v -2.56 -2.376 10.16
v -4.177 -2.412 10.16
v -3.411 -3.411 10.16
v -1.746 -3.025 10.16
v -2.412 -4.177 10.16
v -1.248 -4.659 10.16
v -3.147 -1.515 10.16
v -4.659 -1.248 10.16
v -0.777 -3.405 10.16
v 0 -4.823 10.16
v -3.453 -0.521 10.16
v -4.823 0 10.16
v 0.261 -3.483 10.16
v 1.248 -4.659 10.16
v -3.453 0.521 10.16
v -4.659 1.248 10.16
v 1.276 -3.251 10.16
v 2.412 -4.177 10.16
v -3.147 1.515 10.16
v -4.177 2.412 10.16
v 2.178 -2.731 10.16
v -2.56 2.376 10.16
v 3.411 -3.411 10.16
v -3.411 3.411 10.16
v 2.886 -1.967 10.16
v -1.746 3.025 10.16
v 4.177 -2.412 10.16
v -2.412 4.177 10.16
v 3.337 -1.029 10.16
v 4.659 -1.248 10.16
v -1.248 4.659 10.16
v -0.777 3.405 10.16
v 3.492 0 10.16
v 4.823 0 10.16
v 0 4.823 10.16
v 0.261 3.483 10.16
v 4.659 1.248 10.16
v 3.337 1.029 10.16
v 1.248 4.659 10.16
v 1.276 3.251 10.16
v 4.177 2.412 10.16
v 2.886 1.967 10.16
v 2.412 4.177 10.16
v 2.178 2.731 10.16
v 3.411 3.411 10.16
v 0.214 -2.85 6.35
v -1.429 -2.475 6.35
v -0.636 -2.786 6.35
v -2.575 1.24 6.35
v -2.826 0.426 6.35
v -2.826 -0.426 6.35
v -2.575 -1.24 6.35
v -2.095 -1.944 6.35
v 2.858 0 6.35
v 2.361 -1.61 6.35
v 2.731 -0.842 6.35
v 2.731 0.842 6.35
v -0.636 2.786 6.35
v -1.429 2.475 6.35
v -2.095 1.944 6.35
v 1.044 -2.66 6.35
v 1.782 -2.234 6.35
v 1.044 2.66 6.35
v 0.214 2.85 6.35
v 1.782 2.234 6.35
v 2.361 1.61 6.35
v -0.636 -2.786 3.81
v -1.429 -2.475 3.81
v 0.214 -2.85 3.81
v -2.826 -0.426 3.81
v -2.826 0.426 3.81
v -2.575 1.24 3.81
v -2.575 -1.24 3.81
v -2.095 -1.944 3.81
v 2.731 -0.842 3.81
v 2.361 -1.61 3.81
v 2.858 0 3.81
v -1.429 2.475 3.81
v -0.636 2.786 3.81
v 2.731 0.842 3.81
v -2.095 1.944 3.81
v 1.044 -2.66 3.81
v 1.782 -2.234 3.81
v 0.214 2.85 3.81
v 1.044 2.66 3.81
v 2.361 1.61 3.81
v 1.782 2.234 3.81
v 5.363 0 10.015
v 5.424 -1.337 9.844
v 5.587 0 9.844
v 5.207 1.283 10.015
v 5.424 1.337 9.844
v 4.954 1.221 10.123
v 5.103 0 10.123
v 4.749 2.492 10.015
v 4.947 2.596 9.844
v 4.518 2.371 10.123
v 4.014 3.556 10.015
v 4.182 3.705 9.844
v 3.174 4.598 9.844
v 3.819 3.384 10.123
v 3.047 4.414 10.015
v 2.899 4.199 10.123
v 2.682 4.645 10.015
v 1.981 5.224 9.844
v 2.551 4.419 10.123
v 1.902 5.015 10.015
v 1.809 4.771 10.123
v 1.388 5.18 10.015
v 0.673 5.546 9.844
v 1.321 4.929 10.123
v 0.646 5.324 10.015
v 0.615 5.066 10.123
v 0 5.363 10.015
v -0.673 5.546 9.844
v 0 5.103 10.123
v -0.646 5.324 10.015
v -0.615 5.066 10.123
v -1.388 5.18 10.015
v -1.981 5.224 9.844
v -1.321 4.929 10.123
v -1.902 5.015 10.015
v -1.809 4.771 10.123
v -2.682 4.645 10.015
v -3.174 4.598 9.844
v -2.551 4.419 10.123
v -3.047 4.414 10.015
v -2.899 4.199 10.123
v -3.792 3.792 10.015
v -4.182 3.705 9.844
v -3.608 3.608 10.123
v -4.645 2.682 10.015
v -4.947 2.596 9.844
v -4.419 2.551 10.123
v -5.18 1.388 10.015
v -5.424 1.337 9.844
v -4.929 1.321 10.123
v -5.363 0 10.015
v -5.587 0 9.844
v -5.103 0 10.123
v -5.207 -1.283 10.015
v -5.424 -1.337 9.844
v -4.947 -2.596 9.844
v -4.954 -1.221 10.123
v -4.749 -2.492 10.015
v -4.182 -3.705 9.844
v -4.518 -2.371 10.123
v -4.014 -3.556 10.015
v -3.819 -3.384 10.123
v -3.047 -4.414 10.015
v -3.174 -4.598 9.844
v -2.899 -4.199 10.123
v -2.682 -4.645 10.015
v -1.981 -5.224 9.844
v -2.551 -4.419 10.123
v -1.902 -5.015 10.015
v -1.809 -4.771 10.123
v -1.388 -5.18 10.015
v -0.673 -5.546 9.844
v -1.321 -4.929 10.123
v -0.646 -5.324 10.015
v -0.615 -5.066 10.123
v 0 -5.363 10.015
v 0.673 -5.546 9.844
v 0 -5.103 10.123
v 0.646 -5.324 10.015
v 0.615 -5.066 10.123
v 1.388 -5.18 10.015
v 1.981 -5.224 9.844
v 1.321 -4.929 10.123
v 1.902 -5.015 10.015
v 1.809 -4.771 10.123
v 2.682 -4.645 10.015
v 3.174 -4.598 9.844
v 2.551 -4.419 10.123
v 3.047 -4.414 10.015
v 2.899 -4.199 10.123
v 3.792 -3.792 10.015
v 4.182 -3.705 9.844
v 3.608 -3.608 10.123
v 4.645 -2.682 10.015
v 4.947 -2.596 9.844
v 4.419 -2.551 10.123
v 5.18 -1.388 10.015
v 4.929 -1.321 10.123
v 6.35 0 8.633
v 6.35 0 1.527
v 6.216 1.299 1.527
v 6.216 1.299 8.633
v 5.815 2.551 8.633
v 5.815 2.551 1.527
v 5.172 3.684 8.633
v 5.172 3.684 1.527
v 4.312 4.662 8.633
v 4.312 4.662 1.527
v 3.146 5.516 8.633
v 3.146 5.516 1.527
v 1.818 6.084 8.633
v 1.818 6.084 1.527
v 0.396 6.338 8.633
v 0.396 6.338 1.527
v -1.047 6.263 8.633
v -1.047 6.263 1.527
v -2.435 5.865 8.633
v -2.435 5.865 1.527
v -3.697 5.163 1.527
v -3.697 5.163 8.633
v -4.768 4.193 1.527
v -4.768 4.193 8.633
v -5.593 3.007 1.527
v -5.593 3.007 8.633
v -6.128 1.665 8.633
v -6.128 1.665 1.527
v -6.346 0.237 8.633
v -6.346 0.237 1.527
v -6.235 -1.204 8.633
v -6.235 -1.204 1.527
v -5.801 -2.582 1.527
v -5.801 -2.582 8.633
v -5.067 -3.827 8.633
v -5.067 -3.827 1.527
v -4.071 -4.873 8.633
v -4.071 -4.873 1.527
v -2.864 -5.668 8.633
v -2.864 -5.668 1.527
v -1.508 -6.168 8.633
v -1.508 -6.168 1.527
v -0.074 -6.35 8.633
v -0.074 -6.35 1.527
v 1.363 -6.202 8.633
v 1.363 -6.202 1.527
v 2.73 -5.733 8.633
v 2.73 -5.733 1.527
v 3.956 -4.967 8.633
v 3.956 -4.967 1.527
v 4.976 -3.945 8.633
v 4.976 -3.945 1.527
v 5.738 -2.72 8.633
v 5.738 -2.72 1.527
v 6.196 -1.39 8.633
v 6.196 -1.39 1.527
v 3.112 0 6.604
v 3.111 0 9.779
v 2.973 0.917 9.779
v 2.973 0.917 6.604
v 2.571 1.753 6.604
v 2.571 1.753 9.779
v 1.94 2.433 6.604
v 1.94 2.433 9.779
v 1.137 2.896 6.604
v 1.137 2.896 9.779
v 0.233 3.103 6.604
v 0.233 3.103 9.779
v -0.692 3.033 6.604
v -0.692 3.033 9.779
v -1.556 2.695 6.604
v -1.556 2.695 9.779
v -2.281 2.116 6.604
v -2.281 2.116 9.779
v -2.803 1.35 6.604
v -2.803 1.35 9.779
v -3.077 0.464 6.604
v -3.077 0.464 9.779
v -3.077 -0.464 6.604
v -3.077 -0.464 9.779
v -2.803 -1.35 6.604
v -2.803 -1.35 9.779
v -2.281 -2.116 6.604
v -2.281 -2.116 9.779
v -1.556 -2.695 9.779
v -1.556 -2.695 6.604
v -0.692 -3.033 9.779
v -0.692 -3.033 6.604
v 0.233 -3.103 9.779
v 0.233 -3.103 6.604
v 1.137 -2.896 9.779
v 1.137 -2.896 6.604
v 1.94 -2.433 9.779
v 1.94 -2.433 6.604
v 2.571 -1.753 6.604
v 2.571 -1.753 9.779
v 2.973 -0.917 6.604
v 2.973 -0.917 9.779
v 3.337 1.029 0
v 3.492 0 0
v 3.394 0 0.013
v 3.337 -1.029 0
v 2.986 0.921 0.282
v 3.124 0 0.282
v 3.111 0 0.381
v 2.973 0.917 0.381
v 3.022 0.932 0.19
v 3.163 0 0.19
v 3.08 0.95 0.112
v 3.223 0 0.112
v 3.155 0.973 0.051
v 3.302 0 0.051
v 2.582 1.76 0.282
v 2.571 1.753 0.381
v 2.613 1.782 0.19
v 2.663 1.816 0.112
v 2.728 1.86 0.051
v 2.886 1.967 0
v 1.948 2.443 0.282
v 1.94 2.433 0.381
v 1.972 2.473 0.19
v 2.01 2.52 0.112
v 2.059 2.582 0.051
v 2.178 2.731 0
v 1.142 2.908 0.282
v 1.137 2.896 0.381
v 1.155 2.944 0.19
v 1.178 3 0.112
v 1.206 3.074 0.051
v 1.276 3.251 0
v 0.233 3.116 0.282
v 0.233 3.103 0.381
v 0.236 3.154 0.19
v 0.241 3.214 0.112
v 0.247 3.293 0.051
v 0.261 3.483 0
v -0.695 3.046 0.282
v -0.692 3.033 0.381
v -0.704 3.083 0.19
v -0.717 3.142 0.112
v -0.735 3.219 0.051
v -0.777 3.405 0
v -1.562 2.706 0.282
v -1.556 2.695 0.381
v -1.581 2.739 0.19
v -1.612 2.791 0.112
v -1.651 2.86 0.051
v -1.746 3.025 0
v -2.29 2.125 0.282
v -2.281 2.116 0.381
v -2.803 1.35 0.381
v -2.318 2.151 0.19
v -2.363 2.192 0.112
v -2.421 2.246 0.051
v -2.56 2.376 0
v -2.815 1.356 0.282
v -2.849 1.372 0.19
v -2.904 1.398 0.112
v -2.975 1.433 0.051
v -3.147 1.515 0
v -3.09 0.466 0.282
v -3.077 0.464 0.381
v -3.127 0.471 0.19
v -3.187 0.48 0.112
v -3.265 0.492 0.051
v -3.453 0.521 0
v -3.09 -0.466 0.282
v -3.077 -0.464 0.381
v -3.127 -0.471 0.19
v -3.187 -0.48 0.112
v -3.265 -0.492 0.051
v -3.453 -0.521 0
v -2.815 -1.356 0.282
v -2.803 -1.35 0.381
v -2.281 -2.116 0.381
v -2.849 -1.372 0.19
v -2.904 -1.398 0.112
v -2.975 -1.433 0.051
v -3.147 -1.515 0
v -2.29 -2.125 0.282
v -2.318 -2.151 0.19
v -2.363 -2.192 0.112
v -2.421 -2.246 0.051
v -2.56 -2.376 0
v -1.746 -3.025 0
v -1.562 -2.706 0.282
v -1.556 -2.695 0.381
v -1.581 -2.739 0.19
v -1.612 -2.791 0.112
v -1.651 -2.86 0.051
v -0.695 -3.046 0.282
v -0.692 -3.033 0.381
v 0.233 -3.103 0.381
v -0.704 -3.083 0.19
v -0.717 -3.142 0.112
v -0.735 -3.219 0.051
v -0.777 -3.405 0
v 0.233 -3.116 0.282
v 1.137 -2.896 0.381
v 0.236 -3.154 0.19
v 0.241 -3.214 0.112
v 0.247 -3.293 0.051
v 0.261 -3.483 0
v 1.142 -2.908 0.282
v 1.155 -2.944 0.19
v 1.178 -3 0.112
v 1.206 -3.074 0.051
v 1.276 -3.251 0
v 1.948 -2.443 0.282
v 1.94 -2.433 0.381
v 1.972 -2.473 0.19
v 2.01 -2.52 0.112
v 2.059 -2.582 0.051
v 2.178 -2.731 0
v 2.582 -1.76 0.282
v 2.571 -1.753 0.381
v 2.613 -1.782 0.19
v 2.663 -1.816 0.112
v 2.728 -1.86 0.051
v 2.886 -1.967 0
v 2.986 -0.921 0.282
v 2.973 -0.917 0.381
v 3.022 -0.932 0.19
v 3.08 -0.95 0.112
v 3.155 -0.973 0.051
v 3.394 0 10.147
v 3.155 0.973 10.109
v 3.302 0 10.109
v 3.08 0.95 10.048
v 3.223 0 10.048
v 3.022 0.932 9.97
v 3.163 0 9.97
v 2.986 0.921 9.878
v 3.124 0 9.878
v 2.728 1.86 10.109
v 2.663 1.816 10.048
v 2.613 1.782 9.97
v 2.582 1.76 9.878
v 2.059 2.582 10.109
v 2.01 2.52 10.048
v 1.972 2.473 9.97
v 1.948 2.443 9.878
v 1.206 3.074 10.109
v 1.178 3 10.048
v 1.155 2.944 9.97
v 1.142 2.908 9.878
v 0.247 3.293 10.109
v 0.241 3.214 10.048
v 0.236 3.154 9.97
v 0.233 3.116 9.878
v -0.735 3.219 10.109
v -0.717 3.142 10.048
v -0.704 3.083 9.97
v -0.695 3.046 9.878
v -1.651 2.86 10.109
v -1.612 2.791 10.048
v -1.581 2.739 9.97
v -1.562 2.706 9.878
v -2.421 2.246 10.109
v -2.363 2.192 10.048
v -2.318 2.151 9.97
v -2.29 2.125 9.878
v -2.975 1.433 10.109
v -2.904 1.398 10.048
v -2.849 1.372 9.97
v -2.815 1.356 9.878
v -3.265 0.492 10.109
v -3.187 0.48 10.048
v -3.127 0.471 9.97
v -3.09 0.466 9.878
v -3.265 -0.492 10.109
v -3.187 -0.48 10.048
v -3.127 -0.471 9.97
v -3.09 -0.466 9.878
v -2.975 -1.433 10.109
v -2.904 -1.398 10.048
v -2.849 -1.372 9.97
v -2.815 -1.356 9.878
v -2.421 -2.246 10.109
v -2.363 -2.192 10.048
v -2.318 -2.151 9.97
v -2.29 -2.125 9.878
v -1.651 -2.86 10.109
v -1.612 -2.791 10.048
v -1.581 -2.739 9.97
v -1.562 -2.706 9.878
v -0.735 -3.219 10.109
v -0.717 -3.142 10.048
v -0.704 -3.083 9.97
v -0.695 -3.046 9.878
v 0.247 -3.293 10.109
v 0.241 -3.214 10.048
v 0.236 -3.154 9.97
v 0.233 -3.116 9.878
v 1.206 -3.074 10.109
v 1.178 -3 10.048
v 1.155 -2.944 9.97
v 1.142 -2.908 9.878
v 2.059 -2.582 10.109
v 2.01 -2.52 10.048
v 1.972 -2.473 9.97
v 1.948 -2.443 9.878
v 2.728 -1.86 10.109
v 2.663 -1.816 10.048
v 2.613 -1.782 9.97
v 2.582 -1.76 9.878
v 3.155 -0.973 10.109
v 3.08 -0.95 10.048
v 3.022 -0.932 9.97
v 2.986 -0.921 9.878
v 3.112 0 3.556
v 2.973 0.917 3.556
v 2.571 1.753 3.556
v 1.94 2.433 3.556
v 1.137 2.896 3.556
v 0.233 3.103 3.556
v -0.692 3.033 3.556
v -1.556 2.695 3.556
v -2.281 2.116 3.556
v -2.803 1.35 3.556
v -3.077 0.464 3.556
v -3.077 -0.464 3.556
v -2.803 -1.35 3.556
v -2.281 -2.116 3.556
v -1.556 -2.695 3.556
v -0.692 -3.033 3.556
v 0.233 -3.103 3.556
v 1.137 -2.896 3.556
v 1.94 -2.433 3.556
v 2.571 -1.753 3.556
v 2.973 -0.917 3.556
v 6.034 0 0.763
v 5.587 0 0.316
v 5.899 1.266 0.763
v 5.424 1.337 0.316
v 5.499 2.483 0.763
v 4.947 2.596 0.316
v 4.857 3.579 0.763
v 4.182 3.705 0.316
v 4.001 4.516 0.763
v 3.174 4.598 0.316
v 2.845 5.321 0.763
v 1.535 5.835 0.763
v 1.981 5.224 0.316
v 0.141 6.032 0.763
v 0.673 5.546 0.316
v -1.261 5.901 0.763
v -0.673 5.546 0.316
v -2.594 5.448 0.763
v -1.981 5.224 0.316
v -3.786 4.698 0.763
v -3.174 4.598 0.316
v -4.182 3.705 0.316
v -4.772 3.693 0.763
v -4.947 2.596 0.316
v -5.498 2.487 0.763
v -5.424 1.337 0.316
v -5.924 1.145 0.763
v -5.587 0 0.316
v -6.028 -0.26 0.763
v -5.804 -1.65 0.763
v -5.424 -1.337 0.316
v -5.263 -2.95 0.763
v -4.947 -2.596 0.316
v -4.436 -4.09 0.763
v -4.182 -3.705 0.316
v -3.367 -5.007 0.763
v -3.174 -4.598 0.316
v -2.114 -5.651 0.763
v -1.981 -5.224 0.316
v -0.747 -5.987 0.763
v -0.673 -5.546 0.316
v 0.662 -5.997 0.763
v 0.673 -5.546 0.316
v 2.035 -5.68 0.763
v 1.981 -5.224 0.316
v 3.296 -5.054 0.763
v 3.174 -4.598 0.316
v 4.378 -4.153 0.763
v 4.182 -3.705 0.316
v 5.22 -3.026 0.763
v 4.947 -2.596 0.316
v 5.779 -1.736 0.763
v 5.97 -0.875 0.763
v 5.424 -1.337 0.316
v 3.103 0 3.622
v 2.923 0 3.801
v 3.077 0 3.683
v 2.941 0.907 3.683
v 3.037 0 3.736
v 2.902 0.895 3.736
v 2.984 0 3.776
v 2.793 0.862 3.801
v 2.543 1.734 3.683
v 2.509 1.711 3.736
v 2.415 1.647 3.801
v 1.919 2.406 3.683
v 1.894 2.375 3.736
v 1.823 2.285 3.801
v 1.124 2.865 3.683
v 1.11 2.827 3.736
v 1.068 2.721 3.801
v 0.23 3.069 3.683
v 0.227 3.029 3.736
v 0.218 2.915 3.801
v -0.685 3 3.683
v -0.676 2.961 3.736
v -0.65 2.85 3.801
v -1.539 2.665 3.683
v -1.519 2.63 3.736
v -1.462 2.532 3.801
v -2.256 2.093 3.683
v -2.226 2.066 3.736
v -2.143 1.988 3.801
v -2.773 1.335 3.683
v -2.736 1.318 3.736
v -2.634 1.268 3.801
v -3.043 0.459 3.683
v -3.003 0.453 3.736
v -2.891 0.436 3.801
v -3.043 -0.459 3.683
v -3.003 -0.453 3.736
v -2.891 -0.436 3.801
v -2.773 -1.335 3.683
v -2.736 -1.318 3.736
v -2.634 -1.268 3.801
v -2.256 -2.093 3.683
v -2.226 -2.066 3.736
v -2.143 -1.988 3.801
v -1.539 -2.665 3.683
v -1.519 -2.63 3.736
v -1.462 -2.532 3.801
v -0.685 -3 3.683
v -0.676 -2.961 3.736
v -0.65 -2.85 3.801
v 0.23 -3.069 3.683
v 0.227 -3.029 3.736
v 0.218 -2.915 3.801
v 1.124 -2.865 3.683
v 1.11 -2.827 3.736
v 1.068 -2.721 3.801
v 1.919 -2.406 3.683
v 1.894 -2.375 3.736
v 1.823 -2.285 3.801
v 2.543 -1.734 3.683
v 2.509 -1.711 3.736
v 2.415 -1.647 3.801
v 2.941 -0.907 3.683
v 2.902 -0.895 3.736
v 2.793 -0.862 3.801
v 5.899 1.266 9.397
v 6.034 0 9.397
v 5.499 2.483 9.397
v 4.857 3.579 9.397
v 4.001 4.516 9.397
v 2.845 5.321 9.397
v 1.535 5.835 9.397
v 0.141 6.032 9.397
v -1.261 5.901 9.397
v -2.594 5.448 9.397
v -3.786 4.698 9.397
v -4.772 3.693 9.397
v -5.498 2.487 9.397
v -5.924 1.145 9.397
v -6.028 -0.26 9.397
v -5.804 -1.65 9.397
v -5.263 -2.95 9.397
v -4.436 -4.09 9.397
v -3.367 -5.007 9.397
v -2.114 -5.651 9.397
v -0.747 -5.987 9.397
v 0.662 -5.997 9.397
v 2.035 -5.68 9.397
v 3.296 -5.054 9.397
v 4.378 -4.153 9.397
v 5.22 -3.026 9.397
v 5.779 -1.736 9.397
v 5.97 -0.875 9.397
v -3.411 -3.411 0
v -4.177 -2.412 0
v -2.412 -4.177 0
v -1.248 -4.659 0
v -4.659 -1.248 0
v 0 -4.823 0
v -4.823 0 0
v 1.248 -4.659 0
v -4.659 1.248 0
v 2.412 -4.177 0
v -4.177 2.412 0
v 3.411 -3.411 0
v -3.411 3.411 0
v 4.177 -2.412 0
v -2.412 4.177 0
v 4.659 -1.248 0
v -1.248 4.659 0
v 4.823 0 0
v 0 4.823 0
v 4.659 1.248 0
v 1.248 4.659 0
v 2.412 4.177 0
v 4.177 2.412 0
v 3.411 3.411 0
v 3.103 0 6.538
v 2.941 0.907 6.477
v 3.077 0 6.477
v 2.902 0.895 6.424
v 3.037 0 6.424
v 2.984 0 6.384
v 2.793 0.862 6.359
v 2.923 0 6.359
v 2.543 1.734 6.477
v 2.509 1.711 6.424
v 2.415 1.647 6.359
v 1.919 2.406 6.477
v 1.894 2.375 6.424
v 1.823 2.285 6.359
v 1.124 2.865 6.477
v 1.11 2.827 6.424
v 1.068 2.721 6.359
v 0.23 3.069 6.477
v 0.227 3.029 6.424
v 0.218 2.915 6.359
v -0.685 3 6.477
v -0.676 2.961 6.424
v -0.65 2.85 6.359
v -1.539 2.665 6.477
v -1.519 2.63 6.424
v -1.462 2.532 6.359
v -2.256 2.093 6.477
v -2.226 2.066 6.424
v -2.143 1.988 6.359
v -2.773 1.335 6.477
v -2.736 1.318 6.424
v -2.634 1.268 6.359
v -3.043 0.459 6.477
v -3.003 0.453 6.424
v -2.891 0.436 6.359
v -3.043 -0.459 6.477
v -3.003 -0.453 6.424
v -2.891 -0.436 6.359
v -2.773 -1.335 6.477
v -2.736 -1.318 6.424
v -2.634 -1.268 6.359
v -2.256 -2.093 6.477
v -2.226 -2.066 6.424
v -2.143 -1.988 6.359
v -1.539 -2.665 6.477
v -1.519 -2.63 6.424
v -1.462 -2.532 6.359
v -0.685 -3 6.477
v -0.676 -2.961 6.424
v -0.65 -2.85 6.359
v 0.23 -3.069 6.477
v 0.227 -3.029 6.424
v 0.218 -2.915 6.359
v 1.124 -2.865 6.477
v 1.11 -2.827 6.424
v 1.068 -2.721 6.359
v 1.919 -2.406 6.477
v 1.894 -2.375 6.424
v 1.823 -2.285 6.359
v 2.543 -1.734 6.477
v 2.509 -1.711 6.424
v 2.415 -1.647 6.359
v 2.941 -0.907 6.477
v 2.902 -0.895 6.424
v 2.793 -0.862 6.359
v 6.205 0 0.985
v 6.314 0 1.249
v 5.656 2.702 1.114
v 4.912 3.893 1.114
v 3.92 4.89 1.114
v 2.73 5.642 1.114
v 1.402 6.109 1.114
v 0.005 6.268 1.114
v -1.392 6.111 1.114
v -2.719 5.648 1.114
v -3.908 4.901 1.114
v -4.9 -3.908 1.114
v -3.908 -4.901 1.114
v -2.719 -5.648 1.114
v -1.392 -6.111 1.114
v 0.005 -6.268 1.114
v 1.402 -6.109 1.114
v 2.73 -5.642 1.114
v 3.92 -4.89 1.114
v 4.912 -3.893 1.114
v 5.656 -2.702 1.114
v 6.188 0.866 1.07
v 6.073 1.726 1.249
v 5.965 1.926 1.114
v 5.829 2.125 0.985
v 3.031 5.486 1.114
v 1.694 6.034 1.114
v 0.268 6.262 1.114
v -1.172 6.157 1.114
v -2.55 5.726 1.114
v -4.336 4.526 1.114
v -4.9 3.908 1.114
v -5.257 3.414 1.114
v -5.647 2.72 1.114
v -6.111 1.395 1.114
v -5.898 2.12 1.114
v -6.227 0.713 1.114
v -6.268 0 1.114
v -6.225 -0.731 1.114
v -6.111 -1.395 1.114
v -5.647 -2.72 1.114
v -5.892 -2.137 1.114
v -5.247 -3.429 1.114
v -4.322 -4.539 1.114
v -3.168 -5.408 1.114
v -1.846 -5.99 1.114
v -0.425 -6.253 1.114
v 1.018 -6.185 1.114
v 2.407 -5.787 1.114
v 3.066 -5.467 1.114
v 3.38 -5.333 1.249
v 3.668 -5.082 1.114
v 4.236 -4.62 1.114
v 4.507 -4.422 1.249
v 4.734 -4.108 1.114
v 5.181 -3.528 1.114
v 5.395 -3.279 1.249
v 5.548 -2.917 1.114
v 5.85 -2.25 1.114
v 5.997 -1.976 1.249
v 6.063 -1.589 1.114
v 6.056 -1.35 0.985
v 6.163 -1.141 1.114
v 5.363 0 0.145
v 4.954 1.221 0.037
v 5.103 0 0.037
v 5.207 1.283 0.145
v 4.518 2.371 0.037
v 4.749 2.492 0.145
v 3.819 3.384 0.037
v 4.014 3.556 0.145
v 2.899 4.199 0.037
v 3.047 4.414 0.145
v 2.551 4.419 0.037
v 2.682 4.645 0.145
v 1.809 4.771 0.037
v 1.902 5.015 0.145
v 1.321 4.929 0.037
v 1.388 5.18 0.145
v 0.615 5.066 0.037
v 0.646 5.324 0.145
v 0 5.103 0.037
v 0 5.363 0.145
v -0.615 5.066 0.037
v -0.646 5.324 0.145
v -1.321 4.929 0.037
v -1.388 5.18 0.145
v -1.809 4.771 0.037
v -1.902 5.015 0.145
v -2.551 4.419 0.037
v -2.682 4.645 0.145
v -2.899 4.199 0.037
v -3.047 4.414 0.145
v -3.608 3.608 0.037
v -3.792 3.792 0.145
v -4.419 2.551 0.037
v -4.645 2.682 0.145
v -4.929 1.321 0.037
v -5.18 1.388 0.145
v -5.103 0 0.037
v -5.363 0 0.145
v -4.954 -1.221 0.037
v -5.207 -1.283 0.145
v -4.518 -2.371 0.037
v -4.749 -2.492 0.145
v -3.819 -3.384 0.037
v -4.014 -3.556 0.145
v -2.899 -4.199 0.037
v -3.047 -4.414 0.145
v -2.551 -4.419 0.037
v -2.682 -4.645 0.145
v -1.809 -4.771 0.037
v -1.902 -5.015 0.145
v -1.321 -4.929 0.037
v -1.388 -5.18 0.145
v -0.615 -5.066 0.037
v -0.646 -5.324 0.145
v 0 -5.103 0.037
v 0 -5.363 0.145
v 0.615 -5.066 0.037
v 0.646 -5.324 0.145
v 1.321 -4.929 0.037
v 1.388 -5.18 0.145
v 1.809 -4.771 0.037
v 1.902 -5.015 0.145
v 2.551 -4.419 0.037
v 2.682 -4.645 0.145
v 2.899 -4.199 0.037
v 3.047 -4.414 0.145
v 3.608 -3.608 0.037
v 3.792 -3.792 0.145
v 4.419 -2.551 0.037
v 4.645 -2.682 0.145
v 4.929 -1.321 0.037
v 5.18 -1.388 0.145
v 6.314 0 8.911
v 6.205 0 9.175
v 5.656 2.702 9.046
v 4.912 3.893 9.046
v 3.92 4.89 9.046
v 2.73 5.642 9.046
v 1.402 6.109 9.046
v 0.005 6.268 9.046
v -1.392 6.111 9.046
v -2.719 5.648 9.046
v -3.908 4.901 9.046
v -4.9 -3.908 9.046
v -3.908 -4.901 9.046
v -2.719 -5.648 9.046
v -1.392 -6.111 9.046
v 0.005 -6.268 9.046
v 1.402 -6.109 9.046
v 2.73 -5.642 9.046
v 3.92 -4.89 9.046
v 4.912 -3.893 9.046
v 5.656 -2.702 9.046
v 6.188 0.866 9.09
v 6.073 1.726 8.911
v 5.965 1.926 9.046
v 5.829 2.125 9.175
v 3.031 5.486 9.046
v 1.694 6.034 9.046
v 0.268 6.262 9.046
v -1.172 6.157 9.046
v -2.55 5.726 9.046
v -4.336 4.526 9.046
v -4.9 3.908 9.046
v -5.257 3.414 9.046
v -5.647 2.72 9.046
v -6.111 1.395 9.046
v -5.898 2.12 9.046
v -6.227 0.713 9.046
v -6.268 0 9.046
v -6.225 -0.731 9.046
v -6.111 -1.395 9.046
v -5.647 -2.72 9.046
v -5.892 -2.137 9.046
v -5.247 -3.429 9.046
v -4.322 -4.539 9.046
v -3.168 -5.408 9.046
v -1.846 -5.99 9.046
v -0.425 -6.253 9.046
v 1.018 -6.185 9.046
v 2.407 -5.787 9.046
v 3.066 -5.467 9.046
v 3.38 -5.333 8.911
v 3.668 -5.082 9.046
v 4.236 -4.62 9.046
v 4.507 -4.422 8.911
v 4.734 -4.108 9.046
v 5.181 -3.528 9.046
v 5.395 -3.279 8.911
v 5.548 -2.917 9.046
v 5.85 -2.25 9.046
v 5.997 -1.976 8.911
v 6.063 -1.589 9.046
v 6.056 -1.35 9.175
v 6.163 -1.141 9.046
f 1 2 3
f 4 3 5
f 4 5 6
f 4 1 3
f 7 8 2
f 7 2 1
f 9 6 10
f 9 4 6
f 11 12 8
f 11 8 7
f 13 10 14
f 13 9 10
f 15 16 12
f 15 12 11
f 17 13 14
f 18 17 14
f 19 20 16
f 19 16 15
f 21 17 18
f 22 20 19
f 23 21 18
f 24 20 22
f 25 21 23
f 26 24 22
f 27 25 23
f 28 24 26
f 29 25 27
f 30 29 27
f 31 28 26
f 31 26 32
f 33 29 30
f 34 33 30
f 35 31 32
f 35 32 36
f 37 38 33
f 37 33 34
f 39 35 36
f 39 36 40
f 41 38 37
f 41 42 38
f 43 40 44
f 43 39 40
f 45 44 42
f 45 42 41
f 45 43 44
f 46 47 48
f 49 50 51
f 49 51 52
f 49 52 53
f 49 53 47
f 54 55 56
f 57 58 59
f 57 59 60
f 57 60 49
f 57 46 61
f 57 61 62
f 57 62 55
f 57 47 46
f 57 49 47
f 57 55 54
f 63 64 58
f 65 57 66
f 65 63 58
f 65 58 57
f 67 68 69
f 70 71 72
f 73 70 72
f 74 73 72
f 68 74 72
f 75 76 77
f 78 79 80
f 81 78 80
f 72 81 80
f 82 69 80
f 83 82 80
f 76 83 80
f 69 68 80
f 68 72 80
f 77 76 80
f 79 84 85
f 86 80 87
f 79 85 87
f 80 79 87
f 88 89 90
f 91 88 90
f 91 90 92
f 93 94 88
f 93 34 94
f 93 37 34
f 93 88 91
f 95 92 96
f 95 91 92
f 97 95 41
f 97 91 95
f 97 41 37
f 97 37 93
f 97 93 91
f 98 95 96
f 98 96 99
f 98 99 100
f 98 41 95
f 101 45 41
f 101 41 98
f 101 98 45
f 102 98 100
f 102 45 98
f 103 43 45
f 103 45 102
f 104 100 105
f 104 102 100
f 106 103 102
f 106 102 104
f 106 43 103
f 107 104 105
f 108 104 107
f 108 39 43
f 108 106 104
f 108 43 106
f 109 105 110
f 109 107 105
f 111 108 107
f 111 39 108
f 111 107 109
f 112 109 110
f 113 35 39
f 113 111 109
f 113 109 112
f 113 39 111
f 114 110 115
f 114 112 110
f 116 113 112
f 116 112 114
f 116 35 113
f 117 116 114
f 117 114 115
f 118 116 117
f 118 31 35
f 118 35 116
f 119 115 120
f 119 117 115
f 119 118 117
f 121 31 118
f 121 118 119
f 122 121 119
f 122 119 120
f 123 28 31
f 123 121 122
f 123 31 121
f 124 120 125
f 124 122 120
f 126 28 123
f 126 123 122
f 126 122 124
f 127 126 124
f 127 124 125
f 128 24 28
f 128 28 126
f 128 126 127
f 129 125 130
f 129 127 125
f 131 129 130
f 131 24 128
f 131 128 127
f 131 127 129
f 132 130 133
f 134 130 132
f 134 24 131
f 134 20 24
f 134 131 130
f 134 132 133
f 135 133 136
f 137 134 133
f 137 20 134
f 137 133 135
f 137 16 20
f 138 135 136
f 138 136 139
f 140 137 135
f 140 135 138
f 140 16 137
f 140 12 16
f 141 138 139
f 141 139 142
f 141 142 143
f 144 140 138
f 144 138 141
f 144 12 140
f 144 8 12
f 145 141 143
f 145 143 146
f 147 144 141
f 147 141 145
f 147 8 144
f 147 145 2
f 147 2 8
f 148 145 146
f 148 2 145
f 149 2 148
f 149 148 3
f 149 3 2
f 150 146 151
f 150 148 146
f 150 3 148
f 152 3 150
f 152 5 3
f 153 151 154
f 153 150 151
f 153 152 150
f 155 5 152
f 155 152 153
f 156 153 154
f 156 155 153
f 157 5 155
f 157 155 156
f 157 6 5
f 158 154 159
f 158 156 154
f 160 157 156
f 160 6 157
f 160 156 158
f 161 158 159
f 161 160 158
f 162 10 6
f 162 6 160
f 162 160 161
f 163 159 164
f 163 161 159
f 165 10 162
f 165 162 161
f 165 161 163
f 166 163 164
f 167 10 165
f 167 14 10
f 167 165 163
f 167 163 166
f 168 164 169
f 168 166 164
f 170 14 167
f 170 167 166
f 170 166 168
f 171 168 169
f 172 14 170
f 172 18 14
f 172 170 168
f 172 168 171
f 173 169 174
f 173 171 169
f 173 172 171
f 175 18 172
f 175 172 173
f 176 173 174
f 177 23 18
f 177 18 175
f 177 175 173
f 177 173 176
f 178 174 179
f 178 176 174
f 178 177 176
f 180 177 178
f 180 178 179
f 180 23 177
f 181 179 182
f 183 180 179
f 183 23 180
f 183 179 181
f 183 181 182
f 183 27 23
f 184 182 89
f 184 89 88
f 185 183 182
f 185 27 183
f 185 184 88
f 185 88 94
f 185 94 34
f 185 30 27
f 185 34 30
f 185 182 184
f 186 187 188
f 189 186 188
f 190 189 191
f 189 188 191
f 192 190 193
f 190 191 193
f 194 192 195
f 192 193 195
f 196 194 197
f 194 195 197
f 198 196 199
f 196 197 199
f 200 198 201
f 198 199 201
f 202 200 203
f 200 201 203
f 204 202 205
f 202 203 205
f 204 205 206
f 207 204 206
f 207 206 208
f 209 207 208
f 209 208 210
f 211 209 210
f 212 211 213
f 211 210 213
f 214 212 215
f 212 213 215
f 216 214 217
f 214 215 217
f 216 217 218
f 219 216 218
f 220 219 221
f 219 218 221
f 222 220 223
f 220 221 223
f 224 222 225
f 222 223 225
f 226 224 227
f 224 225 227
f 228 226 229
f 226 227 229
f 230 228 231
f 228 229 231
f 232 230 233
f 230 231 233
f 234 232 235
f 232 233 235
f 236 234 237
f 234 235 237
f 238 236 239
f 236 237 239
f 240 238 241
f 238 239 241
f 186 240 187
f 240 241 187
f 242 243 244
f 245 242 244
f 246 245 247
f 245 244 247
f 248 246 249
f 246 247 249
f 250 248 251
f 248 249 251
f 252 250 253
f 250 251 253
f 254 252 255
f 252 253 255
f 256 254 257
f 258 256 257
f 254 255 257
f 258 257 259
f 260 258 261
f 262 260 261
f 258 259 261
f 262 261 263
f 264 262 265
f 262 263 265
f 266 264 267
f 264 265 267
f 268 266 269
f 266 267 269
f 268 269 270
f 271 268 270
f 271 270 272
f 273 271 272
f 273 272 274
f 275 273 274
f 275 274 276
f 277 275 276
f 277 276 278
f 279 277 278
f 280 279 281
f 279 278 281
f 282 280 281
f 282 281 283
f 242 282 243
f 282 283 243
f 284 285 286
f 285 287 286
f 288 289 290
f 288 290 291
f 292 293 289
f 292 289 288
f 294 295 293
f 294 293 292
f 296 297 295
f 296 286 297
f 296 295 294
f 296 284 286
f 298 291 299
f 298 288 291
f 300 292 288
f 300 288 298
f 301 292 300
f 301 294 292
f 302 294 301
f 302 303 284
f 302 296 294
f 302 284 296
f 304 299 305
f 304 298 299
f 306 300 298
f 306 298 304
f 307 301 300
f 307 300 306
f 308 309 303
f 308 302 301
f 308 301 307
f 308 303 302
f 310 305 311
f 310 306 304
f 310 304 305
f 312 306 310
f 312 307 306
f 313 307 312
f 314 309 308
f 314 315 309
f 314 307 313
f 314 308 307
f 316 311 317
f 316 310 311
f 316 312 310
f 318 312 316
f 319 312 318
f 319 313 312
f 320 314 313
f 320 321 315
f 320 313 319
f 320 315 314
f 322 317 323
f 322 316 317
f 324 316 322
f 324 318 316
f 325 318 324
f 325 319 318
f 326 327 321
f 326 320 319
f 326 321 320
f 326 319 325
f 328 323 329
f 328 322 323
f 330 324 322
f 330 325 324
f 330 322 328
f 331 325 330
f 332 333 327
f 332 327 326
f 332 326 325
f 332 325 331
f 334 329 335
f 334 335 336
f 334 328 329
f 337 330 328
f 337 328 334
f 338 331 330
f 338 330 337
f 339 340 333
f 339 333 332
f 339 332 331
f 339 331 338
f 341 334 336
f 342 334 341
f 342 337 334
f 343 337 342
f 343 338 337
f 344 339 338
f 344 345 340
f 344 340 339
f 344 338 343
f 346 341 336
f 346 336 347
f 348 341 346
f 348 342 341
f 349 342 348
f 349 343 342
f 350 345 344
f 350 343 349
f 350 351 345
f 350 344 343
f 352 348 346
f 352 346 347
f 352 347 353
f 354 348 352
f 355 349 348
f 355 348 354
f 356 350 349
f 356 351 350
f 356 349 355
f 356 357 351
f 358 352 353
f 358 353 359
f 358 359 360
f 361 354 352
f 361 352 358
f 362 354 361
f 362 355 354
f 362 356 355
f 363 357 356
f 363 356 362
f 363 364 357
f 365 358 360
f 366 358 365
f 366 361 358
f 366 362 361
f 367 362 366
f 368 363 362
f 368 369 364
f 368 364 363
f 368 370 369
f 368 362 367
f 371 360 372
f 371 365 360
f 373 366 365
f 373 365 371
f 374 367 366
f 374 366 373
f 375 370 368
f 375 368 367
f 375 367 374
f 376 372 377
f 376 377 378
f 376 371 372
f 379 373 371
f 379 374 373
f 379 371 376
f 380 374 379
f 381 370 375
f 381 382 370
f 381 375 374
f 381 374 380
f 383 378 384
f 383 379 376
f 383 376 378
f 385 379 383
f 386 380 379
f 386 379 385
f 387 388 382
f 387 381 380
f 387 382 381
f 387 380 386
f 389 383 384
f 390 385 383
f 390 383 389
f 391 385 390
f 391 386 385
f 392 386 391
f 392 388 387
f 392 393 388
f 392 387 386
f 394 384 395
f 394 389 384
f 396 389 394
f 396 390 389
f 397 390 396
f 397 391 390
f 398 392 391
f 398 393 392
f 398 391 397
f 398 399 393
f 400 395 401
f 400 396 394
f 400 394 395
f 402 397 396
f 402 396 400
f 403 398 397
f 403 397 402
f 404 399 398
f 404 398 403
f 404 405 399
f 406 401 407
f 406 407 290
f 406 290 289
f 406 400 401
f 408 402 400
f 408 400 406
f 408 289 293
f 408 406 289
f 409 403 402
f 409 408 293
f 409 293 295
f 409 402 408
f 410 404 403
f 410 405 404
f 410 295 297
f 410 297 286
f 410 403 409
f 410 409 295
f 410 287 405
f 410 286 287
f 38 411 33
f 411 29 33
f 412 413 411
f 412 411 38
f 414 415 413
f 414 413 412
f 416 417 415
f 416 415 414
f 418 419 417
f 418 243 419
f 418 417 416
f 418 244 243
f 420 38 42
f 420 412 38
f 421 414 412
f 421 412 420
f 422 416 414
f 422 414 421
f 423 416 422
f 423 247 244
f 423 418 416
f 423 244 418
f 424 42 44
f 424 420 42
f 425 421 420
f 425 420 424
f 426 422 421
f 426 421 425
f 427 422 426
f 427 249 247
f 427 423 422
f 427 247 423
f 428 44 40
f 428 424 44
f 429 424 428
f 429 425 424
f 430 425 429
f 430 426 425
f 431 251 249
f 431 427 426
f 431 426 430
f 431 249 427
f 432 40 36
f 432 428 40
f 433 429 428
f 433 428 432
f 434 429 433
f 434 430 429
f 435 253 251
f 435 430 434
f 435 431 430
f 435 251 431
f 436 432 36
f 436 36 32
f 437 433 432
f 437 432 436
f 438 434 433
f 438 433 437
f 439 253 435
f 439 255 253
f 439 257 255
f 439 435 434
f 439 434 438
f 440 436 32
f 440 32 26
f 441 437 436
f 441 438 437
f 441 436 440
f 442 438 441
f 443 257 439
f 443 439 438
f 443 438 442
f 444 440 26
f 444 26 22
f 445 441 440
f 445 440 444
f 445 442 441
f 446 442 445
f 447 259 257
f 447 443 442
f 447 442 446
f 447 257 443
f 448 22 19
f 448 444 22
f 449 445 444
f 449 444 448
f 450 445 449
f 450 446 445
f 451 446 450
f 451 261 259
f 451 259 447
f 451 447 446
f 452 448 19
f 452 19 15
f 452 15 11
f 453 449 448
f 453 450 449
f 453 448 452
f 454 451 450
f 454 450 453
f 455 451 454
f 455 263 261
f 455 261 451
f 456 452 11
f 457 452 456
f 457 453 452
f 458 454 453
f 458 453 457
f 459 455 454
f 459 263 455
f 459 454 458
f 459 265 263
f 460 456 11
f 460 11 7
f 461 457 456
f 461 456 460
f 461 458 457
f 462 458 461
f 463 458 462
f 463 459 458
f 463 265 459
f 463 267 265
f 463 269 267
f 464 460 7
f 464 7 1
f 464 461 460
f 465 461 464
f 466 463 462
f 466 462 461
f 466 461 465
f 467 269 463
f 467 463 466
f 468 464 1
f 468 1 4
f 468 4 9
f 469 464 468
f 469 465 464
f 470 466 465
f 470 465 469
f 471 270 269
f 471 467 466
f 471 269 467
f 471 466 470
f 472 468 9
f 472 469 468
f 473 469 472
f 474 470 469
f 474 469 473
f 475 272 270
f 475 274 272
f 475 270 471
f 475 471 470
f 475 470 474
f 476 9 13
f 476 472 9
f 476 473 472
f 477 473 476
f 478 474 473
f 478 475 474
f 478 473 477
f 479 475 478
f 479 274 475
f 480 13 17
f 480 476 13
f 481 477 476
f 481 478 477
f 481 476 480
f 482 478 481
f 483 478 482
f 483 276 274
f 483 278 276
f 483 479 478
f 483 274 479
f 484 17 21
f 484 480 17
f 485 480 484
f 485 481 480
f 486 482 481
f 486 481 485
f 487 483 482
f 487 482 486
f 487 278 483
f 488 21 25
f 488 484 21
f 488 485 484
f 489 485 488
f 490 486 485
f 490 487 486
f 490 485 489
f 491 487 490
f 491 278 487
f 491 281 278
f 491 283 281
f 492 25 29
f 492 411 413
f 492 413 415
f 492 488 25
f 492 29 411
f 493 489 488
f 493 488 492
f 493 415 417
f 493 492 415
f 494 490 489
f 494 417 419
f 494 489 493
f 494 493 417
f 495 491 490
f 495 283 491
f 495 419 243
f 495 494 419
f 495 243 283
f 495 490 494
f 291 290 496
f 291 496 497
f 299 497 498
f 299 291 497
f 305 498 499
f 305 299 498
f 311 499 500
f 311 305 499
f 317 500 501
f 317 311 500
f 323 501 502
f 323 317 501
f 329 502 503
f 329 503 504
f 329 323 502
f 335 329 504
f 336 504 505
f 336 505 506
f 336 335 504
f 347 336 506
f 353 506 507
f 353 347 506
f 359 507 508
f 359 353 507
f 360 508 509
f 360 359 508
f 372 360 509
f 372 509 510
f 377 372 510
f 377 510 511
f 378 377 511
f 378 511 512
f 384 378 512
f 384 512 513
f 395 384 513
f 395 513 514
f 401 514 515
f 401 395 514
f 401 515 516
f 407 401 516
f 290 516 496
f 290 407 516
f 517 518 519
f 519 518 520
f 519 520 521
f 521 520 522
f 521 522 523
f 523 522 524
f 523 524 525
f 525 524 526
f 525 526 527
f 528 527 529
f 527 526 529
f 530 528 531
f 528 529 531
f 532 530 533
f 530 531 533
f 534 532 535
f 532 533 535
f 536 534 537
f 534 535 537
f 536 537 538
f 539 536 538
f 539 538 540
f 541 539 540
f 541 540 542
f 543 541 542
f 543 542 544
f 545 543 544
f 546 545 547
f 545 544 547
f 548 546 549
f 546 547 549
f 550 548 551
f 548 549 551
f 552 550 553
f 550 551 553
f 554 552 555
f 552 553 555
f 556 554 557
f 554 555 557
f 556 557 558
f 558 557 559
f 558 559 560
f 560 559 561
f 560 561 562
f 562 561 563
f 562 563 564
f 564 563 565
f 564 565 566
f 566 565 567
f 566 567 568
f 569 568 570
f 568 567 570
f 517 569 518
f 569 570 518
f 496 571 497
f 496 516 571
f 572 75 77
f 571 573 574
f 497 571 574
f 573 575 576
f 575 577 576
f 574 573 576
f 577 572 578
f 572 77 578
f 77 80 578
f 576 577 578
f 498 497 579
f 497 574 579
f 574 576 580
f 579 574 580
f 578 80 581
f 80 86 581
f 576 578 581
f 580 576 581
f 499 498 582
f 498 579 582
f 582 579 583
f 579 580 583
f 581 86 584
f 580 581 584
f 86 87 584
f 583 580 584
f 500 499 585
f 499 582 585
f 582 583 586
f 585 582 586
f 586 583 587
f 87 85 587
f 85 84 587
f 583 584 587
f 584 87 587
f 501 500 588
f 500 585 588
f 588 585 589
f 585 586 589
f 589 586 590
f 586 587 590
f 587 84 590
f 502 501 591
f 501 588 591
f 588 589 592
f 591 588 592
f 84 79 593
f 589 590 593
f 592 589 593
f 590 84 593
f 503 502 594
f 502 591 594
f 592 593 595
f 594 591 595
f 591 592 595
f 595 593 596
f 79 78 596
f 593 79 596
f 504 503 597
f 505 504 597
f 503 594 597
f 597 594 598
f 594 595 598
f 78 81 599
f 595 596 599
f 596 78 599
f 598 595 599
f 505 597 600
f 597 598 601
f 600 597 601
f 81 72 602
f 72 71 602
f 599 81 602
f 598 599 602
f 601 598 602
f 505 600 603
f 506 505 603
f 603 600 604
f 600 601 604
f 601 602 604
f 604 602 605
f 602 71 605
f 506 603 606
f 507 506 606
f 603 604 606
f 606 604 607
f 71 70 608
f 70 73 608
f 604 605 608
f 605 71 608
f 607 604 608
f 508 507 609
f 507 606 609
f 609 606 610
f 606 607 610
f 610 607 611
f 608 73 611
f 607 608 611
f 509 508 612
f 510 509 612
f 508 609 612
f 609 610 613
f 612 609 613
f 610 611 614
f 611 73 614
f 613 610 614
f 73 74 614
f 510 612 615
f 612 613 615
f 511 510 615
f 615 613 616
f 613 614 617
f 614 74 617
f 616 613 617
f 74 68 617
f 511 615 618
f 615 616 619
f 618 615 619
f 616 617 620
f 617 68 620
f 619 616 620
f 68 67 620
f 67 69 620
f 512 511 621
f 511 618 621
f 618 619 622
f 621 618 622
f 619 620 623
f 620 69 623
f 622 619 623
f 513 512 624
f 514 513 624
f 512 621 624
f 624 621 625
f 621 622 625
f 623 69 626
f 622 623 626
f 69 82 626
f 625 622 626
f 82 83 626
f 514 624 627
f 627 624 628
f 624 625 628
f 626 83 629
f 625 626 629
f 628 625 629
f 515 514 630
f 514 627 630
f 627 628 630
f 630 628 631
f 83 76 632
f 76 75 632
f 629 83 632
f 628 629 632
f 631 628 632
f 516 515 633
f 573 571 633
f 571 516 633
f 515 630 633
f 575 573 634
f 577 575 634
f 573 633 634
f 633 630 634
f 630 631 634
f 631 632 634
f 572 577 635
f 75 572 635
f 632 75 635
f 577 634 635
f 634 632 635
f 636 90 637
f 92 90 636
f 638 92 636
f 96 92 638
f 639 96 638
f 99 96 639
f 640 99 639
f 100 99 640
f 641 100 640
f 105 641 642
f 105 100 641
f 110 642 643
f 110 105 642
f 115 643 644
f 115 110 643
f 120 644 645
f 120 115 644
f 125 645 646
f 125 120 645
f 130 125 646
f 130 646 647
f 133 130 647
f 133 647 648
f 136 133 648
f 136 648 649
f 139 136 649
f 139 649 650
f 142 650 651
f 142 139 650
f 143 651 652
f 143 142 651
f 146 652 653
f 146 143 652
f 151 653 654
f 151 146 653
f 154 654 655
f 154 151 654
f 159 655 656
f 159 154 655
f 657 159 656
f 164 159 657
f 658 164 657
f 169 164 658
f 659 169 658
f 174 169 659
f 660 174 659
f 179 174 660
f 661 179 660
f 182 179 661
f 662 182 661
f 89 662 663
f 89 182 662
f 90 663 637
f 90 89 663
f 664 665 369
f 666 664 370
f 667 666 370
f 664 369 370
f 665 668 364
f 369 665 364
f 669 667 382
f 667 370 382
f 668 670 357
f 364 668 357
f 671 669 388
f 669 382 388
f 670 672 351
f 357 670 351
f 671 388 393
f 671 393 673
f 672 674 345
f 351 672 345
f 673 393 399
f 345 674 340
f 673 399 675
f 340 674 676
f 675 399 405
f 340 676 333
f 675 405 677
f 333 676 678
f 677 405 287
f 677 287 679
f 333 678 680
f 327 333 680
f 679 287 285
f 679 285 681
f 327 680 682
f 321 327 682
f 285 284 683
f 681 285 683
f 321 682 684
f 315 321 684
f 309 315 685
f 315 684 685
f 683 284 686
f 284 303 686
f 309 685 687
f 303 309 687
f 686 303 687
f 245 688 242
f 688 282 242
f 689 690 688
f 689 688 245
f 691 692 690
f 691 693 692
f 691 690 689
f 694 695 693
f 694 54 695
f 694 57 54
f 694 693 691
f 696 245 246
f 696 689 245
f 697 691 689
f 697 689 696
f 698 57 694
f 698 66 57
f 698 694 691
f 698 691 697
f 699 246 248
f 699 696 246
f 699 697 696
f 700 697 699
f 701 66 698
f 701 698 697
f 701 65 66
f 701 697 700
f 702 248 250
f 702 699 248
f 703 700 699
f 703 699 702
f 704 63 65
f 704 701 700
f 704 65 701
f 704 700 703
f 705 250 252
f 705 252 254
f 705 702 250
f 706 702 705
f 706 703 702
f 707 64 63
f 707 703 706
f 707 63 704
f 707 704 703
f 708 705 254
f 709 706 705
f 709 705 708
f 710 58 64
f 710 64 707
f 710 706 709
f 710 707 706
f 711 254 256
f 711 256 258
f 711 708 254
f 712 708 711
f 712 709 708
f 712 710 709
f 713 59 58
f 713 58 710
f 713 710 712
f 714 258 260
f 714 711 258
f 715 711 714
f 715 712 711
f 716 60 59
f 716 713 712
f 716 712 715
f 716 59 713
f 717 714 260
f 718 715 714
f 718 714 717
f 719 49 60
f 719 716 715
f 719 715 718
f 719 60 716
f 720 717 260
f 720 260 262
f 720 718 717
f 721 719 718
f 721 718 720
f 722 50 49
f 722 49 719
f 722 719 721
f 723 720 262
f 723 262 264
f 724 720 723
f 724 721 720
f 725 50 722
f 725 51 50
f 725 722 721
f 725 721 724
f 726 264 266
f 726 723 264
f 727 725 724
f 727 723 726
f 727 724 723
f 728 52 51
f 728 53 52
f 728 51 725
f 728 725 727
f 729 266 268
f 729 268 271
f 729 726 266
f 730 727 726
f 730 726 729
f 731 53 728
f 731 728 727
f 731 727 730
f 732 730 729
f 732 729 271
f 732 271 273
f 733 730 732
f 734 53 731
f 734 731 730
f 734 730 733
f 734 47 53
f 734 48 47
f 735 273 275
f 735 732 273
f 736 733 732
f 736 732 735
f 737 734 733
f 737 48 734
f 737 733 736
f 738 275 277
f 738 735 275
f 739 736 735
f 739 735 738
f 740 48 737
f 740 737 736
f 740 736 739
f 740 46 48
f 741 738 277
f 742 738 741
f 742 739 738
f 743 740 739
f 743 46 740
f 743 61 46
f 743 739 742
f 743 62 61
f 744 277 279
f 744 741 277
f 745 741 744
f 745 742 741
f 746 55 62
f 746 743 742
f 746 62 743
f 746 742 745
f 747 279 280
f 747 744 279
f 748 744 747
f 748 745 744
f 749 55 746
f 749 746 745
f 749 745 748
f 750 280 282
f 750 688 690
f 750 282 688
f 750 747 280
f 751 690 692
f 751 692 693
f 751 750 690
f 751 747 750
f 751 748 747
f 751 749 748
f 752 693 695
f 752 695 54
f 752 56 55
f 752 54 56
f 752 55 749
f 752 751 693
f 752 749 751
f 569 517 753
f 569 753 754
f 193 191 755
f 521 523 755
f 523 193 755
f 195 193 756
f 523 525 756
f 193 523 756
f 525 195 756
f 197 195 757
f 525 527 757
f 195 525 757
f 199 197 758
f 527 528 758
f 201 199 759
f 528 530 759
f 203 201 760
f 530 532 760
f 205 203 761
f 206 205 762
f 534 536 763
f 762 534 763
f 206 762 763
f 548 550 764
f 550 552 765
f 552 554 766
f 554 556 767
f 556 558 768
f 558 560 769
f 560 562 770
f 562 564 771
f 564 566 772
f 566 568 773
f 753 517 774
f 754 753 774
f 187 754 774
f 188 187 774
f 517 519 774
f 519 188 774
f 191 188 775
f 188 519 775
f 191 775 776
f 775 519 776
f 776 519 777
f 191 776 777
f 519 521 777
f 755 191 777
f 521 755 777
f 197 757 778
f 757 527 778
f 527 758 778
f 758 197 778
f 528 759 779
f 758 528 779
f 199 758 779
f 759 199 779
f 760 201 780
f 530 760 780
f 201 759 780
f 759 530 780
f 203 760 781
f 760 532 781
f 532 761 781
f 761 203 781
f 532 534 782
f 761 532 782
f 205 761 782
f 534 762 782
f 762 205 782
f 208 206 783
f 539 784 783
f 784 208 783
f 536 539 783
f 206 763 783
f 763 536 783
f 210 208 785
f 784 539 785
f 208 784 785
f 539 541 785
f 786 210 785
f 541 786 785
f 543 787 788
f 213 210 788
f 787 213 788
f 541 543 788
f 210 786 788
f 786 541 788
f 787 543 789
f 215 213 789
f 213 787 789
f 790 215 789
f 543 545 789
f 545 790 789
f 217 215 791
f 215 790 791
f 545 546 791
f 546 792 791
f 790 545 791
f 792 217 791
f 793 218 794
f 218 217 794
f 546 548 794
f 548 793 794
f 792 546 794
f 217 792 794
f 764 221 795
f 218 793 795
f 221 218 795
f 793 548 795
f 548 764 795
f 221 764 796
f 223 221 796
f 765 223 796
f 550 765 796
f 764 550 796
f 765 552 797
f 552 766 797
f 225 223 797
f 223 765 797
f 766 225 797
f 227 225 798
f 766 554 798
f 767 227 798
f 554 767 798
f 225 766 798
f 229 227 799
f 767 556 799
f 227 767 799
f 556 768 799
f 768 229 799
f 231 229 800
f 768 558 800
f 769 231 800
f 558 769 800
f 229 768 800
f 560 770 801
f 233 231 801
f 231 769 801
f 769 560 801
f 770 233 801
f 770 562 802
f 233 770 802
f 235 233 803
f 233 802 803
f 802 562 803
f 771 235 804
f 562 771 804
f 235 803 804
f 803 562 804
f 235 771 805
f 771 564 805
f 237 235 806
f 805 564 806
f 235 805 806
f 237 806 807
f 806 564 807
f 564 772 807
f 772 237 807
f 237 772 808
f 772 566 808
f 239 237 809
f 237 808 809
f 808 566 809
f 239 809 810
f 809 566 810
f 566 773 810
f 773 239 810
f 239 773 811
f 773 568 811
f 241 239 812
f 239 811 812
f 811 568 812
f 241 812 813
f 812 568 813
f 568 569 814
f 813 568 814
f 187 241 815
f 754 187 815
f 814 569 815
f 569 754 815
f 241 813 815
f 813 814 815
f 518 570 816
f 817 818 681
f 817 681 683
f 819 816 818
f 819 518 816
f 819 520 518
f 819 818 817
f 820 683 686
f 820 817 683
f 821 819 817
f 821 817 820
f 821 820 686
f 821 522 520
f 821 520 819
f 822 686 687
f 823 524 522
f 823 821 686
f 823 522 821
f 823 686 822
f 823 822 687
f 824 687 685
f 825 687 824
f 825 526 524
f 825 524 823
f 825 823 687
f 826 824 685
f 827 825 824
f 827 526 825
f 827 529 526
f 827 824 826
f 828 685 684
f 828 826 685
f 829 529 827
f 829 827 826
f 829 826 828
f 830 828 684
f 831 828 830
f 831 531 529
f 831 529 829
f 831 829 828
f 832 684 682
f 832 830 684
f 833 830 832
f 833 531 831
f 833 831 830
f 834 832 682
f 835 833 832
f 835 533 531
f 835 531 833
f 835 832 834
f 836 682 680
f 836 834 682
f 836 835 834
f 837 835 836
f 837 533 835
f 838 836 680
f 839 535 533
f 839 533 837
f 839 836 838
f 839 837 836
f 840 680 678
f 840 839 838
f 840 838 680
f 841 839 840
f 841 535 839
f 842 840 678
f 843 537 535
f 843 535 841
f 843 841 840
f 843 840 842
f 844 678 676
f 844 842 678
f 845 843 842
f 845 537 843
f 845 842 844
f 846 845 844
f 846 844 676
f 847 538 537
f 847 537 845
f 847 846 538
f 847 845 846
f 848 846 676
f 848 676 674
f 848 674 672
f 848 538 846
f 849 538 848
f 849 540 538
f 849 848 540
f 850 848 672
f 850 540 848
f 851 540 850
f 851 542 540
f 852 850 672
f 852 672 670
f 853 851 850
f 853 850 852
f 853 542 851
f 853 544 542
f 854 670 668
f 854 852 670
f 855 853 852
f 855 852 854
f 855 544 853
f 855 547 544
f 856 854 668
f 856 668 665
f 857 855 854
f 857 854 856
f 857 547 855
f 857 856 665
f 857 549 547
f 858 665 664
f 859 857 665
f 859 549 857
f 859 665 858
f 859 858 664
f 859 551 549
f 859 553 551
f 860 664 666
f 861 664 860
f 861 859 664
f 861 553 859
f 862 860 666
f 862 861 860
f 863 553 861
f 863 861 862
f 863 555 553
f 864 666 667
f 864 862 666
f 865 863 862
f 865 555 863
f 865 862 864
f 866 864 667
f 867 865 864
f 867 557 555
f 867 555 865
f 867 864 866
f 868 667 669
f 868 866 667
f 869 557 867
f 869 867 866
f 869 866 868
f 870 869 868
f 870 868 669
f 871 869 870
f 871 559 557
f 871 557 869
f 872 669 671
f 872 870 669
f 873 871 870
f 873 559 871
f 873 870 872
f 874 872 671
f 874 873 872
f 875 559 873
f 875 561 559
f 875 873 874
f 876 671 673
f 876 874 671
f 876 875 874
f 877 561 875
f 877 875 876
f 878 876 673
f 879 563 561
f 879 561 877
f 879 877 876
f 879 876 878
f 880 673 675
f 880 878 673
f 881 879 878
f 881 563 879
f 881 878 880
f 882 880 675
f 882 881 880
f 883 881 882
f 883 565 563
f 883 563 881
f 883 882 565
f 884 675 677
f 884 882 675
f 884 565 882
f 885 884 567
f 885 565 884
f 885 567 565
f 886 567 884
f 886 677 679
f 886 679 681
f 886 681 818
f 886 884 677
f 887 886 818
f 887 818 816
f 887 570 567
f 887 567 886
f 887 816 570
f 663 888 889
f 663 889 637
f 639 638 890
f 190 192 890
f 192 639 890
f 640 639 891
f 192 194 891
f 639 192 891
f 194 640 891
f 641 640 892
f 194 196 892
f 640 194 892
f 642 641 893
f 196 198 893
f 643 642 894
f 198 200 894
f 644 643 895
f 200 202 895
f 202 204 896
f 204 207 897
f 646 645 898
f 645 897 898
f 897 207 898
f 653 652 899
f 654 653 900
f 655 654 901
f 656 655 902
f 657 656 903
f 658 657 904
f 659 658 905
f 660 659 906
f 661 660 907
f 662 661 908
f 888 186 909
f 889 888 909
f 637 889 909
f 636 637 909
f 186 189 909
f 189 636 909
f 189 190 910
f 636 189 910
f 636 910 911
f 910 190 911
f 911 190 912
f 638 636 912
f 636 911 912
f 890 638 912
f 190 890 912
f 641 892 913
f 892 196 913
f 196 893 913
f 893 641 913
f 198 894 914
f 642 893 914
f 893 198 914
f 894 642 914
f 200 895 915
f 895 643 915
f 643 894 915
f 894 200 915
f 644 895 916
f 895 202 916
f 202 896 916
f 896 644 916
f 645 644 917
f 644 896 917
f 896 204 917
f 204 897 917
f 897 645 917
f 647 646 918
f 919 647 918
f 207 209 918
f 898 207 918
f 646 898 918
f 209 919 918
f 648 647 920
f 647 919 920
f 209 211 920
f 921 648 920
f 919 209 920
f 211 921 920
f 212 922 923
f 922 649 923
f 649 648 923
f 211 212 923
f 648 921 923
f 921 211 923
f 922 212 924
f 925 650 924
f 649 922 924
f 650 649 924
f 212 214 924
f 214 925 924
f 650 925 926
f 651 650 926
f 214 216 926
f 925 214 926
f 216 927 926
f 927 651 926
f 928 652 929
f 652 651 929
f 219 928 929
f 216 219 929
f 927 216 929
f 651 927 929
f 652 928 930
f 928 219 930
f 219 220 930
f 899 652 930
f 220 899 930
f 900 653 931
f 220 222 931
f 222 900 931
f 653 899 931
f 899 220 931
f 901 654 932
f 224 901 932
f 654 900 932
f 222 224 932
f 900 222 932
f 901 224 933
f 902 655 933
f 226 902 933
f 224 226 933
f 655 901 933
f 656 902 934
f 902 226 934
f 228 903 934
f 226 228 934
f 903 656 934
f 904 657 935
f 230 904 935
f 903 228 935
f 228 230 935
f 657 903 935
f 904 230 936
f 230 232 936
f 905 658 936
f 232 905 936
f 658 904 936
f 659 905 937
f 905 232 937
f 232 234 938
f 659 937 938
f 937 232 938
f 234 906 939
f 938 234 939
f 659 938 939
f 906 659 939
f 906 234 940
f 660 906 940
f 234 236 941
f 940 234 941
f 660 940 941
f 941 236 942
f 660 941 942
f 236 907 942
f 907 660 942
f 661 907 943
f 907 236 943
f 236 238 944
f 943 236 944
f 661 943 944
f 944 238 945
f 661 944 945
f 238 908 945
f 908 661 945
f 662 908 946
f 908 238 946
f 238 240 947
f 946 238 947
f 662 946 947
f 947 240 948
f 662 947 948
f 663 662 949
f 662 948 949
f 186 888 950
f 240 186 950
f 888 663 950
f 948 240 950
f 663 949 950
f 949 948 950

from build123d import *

# Parameters (mm, degrees)
SKETCH1_R           = 6.35
BOSS_EXTRUDE1_DEPTH = 10.16
SKETCH2_R           = 3.1115
CUT_EXTRUDE1_DEPTH  = 3.81
CHAMFER1_SIZE       = 1.0795
FILLET1_R           = 0.254
FILLET2_R           = 0.381
FILLET3_R           = 1.0795


with BuildPart() as part:
    # Sketch1 → Boss-Extrude1 (new body)
    with BuildSketch(Plane.XY):
        Circle(SKETCH1_R)
    extrude(amount=BOSS_EXTRUDE1_DEPTH)

    # Sketch2 → Cut-Extrude1 (cut)
    with BuildSketch(Plane.XY.offset(10.16)):
        Circle(SKETCH2_R)
    cut_extrude1 = extrude(amount=-CUT_EXTRUDE1_DEPTH, mode=Mode.SUBTRACT)

    # Mirror1: Cut-Extrude1 across plane
    add(cut_extrude1.mirror(Plane.XY.offset(5.08)), mode=Mode.SUBTRACT)

    # Chamfer1
    chamfer1_edges = [part.edges().sort_by_distance(p)[0] for p in [
        (-6.35, 0, 0),
        (-6.35, 0, 10.16),
    ]]
    chamfer(chamfer1_edges, length=CHAMFER1_SIZE)

    # Fillet1
    fillet1_edges = [part.edges().sort_by_distance(p)[0] for p in [
        (-3.1115, 0, 3.81),
        (-3.1115, 0, 6.35),
    ]]
    fillet(fillet1_edges, radius=FILLET1_R)

    # Fillet2
    fillet2_edges = [part.edges().sort_by_distance(p)[0] for p in [
        (-3.1115, 0, 0),
        (-3.1115, 0, 10.16),
    ]]
    fillet(fillet2_edges, radius=FILLET2_R)

    # Fillet3
    fillet3_edges = [part.edges().sort_by_distance(p)[0] for p in [
        (-6.35, 0, 9.0805),
        (-6.35, 0, 1.0795),
        (-5.2705, 0, 0),
        (-5.2705, 0, 10.16),
    ]]
    fillet(fillet3_edges, radius=FILLET3_R)


solid = part.part
